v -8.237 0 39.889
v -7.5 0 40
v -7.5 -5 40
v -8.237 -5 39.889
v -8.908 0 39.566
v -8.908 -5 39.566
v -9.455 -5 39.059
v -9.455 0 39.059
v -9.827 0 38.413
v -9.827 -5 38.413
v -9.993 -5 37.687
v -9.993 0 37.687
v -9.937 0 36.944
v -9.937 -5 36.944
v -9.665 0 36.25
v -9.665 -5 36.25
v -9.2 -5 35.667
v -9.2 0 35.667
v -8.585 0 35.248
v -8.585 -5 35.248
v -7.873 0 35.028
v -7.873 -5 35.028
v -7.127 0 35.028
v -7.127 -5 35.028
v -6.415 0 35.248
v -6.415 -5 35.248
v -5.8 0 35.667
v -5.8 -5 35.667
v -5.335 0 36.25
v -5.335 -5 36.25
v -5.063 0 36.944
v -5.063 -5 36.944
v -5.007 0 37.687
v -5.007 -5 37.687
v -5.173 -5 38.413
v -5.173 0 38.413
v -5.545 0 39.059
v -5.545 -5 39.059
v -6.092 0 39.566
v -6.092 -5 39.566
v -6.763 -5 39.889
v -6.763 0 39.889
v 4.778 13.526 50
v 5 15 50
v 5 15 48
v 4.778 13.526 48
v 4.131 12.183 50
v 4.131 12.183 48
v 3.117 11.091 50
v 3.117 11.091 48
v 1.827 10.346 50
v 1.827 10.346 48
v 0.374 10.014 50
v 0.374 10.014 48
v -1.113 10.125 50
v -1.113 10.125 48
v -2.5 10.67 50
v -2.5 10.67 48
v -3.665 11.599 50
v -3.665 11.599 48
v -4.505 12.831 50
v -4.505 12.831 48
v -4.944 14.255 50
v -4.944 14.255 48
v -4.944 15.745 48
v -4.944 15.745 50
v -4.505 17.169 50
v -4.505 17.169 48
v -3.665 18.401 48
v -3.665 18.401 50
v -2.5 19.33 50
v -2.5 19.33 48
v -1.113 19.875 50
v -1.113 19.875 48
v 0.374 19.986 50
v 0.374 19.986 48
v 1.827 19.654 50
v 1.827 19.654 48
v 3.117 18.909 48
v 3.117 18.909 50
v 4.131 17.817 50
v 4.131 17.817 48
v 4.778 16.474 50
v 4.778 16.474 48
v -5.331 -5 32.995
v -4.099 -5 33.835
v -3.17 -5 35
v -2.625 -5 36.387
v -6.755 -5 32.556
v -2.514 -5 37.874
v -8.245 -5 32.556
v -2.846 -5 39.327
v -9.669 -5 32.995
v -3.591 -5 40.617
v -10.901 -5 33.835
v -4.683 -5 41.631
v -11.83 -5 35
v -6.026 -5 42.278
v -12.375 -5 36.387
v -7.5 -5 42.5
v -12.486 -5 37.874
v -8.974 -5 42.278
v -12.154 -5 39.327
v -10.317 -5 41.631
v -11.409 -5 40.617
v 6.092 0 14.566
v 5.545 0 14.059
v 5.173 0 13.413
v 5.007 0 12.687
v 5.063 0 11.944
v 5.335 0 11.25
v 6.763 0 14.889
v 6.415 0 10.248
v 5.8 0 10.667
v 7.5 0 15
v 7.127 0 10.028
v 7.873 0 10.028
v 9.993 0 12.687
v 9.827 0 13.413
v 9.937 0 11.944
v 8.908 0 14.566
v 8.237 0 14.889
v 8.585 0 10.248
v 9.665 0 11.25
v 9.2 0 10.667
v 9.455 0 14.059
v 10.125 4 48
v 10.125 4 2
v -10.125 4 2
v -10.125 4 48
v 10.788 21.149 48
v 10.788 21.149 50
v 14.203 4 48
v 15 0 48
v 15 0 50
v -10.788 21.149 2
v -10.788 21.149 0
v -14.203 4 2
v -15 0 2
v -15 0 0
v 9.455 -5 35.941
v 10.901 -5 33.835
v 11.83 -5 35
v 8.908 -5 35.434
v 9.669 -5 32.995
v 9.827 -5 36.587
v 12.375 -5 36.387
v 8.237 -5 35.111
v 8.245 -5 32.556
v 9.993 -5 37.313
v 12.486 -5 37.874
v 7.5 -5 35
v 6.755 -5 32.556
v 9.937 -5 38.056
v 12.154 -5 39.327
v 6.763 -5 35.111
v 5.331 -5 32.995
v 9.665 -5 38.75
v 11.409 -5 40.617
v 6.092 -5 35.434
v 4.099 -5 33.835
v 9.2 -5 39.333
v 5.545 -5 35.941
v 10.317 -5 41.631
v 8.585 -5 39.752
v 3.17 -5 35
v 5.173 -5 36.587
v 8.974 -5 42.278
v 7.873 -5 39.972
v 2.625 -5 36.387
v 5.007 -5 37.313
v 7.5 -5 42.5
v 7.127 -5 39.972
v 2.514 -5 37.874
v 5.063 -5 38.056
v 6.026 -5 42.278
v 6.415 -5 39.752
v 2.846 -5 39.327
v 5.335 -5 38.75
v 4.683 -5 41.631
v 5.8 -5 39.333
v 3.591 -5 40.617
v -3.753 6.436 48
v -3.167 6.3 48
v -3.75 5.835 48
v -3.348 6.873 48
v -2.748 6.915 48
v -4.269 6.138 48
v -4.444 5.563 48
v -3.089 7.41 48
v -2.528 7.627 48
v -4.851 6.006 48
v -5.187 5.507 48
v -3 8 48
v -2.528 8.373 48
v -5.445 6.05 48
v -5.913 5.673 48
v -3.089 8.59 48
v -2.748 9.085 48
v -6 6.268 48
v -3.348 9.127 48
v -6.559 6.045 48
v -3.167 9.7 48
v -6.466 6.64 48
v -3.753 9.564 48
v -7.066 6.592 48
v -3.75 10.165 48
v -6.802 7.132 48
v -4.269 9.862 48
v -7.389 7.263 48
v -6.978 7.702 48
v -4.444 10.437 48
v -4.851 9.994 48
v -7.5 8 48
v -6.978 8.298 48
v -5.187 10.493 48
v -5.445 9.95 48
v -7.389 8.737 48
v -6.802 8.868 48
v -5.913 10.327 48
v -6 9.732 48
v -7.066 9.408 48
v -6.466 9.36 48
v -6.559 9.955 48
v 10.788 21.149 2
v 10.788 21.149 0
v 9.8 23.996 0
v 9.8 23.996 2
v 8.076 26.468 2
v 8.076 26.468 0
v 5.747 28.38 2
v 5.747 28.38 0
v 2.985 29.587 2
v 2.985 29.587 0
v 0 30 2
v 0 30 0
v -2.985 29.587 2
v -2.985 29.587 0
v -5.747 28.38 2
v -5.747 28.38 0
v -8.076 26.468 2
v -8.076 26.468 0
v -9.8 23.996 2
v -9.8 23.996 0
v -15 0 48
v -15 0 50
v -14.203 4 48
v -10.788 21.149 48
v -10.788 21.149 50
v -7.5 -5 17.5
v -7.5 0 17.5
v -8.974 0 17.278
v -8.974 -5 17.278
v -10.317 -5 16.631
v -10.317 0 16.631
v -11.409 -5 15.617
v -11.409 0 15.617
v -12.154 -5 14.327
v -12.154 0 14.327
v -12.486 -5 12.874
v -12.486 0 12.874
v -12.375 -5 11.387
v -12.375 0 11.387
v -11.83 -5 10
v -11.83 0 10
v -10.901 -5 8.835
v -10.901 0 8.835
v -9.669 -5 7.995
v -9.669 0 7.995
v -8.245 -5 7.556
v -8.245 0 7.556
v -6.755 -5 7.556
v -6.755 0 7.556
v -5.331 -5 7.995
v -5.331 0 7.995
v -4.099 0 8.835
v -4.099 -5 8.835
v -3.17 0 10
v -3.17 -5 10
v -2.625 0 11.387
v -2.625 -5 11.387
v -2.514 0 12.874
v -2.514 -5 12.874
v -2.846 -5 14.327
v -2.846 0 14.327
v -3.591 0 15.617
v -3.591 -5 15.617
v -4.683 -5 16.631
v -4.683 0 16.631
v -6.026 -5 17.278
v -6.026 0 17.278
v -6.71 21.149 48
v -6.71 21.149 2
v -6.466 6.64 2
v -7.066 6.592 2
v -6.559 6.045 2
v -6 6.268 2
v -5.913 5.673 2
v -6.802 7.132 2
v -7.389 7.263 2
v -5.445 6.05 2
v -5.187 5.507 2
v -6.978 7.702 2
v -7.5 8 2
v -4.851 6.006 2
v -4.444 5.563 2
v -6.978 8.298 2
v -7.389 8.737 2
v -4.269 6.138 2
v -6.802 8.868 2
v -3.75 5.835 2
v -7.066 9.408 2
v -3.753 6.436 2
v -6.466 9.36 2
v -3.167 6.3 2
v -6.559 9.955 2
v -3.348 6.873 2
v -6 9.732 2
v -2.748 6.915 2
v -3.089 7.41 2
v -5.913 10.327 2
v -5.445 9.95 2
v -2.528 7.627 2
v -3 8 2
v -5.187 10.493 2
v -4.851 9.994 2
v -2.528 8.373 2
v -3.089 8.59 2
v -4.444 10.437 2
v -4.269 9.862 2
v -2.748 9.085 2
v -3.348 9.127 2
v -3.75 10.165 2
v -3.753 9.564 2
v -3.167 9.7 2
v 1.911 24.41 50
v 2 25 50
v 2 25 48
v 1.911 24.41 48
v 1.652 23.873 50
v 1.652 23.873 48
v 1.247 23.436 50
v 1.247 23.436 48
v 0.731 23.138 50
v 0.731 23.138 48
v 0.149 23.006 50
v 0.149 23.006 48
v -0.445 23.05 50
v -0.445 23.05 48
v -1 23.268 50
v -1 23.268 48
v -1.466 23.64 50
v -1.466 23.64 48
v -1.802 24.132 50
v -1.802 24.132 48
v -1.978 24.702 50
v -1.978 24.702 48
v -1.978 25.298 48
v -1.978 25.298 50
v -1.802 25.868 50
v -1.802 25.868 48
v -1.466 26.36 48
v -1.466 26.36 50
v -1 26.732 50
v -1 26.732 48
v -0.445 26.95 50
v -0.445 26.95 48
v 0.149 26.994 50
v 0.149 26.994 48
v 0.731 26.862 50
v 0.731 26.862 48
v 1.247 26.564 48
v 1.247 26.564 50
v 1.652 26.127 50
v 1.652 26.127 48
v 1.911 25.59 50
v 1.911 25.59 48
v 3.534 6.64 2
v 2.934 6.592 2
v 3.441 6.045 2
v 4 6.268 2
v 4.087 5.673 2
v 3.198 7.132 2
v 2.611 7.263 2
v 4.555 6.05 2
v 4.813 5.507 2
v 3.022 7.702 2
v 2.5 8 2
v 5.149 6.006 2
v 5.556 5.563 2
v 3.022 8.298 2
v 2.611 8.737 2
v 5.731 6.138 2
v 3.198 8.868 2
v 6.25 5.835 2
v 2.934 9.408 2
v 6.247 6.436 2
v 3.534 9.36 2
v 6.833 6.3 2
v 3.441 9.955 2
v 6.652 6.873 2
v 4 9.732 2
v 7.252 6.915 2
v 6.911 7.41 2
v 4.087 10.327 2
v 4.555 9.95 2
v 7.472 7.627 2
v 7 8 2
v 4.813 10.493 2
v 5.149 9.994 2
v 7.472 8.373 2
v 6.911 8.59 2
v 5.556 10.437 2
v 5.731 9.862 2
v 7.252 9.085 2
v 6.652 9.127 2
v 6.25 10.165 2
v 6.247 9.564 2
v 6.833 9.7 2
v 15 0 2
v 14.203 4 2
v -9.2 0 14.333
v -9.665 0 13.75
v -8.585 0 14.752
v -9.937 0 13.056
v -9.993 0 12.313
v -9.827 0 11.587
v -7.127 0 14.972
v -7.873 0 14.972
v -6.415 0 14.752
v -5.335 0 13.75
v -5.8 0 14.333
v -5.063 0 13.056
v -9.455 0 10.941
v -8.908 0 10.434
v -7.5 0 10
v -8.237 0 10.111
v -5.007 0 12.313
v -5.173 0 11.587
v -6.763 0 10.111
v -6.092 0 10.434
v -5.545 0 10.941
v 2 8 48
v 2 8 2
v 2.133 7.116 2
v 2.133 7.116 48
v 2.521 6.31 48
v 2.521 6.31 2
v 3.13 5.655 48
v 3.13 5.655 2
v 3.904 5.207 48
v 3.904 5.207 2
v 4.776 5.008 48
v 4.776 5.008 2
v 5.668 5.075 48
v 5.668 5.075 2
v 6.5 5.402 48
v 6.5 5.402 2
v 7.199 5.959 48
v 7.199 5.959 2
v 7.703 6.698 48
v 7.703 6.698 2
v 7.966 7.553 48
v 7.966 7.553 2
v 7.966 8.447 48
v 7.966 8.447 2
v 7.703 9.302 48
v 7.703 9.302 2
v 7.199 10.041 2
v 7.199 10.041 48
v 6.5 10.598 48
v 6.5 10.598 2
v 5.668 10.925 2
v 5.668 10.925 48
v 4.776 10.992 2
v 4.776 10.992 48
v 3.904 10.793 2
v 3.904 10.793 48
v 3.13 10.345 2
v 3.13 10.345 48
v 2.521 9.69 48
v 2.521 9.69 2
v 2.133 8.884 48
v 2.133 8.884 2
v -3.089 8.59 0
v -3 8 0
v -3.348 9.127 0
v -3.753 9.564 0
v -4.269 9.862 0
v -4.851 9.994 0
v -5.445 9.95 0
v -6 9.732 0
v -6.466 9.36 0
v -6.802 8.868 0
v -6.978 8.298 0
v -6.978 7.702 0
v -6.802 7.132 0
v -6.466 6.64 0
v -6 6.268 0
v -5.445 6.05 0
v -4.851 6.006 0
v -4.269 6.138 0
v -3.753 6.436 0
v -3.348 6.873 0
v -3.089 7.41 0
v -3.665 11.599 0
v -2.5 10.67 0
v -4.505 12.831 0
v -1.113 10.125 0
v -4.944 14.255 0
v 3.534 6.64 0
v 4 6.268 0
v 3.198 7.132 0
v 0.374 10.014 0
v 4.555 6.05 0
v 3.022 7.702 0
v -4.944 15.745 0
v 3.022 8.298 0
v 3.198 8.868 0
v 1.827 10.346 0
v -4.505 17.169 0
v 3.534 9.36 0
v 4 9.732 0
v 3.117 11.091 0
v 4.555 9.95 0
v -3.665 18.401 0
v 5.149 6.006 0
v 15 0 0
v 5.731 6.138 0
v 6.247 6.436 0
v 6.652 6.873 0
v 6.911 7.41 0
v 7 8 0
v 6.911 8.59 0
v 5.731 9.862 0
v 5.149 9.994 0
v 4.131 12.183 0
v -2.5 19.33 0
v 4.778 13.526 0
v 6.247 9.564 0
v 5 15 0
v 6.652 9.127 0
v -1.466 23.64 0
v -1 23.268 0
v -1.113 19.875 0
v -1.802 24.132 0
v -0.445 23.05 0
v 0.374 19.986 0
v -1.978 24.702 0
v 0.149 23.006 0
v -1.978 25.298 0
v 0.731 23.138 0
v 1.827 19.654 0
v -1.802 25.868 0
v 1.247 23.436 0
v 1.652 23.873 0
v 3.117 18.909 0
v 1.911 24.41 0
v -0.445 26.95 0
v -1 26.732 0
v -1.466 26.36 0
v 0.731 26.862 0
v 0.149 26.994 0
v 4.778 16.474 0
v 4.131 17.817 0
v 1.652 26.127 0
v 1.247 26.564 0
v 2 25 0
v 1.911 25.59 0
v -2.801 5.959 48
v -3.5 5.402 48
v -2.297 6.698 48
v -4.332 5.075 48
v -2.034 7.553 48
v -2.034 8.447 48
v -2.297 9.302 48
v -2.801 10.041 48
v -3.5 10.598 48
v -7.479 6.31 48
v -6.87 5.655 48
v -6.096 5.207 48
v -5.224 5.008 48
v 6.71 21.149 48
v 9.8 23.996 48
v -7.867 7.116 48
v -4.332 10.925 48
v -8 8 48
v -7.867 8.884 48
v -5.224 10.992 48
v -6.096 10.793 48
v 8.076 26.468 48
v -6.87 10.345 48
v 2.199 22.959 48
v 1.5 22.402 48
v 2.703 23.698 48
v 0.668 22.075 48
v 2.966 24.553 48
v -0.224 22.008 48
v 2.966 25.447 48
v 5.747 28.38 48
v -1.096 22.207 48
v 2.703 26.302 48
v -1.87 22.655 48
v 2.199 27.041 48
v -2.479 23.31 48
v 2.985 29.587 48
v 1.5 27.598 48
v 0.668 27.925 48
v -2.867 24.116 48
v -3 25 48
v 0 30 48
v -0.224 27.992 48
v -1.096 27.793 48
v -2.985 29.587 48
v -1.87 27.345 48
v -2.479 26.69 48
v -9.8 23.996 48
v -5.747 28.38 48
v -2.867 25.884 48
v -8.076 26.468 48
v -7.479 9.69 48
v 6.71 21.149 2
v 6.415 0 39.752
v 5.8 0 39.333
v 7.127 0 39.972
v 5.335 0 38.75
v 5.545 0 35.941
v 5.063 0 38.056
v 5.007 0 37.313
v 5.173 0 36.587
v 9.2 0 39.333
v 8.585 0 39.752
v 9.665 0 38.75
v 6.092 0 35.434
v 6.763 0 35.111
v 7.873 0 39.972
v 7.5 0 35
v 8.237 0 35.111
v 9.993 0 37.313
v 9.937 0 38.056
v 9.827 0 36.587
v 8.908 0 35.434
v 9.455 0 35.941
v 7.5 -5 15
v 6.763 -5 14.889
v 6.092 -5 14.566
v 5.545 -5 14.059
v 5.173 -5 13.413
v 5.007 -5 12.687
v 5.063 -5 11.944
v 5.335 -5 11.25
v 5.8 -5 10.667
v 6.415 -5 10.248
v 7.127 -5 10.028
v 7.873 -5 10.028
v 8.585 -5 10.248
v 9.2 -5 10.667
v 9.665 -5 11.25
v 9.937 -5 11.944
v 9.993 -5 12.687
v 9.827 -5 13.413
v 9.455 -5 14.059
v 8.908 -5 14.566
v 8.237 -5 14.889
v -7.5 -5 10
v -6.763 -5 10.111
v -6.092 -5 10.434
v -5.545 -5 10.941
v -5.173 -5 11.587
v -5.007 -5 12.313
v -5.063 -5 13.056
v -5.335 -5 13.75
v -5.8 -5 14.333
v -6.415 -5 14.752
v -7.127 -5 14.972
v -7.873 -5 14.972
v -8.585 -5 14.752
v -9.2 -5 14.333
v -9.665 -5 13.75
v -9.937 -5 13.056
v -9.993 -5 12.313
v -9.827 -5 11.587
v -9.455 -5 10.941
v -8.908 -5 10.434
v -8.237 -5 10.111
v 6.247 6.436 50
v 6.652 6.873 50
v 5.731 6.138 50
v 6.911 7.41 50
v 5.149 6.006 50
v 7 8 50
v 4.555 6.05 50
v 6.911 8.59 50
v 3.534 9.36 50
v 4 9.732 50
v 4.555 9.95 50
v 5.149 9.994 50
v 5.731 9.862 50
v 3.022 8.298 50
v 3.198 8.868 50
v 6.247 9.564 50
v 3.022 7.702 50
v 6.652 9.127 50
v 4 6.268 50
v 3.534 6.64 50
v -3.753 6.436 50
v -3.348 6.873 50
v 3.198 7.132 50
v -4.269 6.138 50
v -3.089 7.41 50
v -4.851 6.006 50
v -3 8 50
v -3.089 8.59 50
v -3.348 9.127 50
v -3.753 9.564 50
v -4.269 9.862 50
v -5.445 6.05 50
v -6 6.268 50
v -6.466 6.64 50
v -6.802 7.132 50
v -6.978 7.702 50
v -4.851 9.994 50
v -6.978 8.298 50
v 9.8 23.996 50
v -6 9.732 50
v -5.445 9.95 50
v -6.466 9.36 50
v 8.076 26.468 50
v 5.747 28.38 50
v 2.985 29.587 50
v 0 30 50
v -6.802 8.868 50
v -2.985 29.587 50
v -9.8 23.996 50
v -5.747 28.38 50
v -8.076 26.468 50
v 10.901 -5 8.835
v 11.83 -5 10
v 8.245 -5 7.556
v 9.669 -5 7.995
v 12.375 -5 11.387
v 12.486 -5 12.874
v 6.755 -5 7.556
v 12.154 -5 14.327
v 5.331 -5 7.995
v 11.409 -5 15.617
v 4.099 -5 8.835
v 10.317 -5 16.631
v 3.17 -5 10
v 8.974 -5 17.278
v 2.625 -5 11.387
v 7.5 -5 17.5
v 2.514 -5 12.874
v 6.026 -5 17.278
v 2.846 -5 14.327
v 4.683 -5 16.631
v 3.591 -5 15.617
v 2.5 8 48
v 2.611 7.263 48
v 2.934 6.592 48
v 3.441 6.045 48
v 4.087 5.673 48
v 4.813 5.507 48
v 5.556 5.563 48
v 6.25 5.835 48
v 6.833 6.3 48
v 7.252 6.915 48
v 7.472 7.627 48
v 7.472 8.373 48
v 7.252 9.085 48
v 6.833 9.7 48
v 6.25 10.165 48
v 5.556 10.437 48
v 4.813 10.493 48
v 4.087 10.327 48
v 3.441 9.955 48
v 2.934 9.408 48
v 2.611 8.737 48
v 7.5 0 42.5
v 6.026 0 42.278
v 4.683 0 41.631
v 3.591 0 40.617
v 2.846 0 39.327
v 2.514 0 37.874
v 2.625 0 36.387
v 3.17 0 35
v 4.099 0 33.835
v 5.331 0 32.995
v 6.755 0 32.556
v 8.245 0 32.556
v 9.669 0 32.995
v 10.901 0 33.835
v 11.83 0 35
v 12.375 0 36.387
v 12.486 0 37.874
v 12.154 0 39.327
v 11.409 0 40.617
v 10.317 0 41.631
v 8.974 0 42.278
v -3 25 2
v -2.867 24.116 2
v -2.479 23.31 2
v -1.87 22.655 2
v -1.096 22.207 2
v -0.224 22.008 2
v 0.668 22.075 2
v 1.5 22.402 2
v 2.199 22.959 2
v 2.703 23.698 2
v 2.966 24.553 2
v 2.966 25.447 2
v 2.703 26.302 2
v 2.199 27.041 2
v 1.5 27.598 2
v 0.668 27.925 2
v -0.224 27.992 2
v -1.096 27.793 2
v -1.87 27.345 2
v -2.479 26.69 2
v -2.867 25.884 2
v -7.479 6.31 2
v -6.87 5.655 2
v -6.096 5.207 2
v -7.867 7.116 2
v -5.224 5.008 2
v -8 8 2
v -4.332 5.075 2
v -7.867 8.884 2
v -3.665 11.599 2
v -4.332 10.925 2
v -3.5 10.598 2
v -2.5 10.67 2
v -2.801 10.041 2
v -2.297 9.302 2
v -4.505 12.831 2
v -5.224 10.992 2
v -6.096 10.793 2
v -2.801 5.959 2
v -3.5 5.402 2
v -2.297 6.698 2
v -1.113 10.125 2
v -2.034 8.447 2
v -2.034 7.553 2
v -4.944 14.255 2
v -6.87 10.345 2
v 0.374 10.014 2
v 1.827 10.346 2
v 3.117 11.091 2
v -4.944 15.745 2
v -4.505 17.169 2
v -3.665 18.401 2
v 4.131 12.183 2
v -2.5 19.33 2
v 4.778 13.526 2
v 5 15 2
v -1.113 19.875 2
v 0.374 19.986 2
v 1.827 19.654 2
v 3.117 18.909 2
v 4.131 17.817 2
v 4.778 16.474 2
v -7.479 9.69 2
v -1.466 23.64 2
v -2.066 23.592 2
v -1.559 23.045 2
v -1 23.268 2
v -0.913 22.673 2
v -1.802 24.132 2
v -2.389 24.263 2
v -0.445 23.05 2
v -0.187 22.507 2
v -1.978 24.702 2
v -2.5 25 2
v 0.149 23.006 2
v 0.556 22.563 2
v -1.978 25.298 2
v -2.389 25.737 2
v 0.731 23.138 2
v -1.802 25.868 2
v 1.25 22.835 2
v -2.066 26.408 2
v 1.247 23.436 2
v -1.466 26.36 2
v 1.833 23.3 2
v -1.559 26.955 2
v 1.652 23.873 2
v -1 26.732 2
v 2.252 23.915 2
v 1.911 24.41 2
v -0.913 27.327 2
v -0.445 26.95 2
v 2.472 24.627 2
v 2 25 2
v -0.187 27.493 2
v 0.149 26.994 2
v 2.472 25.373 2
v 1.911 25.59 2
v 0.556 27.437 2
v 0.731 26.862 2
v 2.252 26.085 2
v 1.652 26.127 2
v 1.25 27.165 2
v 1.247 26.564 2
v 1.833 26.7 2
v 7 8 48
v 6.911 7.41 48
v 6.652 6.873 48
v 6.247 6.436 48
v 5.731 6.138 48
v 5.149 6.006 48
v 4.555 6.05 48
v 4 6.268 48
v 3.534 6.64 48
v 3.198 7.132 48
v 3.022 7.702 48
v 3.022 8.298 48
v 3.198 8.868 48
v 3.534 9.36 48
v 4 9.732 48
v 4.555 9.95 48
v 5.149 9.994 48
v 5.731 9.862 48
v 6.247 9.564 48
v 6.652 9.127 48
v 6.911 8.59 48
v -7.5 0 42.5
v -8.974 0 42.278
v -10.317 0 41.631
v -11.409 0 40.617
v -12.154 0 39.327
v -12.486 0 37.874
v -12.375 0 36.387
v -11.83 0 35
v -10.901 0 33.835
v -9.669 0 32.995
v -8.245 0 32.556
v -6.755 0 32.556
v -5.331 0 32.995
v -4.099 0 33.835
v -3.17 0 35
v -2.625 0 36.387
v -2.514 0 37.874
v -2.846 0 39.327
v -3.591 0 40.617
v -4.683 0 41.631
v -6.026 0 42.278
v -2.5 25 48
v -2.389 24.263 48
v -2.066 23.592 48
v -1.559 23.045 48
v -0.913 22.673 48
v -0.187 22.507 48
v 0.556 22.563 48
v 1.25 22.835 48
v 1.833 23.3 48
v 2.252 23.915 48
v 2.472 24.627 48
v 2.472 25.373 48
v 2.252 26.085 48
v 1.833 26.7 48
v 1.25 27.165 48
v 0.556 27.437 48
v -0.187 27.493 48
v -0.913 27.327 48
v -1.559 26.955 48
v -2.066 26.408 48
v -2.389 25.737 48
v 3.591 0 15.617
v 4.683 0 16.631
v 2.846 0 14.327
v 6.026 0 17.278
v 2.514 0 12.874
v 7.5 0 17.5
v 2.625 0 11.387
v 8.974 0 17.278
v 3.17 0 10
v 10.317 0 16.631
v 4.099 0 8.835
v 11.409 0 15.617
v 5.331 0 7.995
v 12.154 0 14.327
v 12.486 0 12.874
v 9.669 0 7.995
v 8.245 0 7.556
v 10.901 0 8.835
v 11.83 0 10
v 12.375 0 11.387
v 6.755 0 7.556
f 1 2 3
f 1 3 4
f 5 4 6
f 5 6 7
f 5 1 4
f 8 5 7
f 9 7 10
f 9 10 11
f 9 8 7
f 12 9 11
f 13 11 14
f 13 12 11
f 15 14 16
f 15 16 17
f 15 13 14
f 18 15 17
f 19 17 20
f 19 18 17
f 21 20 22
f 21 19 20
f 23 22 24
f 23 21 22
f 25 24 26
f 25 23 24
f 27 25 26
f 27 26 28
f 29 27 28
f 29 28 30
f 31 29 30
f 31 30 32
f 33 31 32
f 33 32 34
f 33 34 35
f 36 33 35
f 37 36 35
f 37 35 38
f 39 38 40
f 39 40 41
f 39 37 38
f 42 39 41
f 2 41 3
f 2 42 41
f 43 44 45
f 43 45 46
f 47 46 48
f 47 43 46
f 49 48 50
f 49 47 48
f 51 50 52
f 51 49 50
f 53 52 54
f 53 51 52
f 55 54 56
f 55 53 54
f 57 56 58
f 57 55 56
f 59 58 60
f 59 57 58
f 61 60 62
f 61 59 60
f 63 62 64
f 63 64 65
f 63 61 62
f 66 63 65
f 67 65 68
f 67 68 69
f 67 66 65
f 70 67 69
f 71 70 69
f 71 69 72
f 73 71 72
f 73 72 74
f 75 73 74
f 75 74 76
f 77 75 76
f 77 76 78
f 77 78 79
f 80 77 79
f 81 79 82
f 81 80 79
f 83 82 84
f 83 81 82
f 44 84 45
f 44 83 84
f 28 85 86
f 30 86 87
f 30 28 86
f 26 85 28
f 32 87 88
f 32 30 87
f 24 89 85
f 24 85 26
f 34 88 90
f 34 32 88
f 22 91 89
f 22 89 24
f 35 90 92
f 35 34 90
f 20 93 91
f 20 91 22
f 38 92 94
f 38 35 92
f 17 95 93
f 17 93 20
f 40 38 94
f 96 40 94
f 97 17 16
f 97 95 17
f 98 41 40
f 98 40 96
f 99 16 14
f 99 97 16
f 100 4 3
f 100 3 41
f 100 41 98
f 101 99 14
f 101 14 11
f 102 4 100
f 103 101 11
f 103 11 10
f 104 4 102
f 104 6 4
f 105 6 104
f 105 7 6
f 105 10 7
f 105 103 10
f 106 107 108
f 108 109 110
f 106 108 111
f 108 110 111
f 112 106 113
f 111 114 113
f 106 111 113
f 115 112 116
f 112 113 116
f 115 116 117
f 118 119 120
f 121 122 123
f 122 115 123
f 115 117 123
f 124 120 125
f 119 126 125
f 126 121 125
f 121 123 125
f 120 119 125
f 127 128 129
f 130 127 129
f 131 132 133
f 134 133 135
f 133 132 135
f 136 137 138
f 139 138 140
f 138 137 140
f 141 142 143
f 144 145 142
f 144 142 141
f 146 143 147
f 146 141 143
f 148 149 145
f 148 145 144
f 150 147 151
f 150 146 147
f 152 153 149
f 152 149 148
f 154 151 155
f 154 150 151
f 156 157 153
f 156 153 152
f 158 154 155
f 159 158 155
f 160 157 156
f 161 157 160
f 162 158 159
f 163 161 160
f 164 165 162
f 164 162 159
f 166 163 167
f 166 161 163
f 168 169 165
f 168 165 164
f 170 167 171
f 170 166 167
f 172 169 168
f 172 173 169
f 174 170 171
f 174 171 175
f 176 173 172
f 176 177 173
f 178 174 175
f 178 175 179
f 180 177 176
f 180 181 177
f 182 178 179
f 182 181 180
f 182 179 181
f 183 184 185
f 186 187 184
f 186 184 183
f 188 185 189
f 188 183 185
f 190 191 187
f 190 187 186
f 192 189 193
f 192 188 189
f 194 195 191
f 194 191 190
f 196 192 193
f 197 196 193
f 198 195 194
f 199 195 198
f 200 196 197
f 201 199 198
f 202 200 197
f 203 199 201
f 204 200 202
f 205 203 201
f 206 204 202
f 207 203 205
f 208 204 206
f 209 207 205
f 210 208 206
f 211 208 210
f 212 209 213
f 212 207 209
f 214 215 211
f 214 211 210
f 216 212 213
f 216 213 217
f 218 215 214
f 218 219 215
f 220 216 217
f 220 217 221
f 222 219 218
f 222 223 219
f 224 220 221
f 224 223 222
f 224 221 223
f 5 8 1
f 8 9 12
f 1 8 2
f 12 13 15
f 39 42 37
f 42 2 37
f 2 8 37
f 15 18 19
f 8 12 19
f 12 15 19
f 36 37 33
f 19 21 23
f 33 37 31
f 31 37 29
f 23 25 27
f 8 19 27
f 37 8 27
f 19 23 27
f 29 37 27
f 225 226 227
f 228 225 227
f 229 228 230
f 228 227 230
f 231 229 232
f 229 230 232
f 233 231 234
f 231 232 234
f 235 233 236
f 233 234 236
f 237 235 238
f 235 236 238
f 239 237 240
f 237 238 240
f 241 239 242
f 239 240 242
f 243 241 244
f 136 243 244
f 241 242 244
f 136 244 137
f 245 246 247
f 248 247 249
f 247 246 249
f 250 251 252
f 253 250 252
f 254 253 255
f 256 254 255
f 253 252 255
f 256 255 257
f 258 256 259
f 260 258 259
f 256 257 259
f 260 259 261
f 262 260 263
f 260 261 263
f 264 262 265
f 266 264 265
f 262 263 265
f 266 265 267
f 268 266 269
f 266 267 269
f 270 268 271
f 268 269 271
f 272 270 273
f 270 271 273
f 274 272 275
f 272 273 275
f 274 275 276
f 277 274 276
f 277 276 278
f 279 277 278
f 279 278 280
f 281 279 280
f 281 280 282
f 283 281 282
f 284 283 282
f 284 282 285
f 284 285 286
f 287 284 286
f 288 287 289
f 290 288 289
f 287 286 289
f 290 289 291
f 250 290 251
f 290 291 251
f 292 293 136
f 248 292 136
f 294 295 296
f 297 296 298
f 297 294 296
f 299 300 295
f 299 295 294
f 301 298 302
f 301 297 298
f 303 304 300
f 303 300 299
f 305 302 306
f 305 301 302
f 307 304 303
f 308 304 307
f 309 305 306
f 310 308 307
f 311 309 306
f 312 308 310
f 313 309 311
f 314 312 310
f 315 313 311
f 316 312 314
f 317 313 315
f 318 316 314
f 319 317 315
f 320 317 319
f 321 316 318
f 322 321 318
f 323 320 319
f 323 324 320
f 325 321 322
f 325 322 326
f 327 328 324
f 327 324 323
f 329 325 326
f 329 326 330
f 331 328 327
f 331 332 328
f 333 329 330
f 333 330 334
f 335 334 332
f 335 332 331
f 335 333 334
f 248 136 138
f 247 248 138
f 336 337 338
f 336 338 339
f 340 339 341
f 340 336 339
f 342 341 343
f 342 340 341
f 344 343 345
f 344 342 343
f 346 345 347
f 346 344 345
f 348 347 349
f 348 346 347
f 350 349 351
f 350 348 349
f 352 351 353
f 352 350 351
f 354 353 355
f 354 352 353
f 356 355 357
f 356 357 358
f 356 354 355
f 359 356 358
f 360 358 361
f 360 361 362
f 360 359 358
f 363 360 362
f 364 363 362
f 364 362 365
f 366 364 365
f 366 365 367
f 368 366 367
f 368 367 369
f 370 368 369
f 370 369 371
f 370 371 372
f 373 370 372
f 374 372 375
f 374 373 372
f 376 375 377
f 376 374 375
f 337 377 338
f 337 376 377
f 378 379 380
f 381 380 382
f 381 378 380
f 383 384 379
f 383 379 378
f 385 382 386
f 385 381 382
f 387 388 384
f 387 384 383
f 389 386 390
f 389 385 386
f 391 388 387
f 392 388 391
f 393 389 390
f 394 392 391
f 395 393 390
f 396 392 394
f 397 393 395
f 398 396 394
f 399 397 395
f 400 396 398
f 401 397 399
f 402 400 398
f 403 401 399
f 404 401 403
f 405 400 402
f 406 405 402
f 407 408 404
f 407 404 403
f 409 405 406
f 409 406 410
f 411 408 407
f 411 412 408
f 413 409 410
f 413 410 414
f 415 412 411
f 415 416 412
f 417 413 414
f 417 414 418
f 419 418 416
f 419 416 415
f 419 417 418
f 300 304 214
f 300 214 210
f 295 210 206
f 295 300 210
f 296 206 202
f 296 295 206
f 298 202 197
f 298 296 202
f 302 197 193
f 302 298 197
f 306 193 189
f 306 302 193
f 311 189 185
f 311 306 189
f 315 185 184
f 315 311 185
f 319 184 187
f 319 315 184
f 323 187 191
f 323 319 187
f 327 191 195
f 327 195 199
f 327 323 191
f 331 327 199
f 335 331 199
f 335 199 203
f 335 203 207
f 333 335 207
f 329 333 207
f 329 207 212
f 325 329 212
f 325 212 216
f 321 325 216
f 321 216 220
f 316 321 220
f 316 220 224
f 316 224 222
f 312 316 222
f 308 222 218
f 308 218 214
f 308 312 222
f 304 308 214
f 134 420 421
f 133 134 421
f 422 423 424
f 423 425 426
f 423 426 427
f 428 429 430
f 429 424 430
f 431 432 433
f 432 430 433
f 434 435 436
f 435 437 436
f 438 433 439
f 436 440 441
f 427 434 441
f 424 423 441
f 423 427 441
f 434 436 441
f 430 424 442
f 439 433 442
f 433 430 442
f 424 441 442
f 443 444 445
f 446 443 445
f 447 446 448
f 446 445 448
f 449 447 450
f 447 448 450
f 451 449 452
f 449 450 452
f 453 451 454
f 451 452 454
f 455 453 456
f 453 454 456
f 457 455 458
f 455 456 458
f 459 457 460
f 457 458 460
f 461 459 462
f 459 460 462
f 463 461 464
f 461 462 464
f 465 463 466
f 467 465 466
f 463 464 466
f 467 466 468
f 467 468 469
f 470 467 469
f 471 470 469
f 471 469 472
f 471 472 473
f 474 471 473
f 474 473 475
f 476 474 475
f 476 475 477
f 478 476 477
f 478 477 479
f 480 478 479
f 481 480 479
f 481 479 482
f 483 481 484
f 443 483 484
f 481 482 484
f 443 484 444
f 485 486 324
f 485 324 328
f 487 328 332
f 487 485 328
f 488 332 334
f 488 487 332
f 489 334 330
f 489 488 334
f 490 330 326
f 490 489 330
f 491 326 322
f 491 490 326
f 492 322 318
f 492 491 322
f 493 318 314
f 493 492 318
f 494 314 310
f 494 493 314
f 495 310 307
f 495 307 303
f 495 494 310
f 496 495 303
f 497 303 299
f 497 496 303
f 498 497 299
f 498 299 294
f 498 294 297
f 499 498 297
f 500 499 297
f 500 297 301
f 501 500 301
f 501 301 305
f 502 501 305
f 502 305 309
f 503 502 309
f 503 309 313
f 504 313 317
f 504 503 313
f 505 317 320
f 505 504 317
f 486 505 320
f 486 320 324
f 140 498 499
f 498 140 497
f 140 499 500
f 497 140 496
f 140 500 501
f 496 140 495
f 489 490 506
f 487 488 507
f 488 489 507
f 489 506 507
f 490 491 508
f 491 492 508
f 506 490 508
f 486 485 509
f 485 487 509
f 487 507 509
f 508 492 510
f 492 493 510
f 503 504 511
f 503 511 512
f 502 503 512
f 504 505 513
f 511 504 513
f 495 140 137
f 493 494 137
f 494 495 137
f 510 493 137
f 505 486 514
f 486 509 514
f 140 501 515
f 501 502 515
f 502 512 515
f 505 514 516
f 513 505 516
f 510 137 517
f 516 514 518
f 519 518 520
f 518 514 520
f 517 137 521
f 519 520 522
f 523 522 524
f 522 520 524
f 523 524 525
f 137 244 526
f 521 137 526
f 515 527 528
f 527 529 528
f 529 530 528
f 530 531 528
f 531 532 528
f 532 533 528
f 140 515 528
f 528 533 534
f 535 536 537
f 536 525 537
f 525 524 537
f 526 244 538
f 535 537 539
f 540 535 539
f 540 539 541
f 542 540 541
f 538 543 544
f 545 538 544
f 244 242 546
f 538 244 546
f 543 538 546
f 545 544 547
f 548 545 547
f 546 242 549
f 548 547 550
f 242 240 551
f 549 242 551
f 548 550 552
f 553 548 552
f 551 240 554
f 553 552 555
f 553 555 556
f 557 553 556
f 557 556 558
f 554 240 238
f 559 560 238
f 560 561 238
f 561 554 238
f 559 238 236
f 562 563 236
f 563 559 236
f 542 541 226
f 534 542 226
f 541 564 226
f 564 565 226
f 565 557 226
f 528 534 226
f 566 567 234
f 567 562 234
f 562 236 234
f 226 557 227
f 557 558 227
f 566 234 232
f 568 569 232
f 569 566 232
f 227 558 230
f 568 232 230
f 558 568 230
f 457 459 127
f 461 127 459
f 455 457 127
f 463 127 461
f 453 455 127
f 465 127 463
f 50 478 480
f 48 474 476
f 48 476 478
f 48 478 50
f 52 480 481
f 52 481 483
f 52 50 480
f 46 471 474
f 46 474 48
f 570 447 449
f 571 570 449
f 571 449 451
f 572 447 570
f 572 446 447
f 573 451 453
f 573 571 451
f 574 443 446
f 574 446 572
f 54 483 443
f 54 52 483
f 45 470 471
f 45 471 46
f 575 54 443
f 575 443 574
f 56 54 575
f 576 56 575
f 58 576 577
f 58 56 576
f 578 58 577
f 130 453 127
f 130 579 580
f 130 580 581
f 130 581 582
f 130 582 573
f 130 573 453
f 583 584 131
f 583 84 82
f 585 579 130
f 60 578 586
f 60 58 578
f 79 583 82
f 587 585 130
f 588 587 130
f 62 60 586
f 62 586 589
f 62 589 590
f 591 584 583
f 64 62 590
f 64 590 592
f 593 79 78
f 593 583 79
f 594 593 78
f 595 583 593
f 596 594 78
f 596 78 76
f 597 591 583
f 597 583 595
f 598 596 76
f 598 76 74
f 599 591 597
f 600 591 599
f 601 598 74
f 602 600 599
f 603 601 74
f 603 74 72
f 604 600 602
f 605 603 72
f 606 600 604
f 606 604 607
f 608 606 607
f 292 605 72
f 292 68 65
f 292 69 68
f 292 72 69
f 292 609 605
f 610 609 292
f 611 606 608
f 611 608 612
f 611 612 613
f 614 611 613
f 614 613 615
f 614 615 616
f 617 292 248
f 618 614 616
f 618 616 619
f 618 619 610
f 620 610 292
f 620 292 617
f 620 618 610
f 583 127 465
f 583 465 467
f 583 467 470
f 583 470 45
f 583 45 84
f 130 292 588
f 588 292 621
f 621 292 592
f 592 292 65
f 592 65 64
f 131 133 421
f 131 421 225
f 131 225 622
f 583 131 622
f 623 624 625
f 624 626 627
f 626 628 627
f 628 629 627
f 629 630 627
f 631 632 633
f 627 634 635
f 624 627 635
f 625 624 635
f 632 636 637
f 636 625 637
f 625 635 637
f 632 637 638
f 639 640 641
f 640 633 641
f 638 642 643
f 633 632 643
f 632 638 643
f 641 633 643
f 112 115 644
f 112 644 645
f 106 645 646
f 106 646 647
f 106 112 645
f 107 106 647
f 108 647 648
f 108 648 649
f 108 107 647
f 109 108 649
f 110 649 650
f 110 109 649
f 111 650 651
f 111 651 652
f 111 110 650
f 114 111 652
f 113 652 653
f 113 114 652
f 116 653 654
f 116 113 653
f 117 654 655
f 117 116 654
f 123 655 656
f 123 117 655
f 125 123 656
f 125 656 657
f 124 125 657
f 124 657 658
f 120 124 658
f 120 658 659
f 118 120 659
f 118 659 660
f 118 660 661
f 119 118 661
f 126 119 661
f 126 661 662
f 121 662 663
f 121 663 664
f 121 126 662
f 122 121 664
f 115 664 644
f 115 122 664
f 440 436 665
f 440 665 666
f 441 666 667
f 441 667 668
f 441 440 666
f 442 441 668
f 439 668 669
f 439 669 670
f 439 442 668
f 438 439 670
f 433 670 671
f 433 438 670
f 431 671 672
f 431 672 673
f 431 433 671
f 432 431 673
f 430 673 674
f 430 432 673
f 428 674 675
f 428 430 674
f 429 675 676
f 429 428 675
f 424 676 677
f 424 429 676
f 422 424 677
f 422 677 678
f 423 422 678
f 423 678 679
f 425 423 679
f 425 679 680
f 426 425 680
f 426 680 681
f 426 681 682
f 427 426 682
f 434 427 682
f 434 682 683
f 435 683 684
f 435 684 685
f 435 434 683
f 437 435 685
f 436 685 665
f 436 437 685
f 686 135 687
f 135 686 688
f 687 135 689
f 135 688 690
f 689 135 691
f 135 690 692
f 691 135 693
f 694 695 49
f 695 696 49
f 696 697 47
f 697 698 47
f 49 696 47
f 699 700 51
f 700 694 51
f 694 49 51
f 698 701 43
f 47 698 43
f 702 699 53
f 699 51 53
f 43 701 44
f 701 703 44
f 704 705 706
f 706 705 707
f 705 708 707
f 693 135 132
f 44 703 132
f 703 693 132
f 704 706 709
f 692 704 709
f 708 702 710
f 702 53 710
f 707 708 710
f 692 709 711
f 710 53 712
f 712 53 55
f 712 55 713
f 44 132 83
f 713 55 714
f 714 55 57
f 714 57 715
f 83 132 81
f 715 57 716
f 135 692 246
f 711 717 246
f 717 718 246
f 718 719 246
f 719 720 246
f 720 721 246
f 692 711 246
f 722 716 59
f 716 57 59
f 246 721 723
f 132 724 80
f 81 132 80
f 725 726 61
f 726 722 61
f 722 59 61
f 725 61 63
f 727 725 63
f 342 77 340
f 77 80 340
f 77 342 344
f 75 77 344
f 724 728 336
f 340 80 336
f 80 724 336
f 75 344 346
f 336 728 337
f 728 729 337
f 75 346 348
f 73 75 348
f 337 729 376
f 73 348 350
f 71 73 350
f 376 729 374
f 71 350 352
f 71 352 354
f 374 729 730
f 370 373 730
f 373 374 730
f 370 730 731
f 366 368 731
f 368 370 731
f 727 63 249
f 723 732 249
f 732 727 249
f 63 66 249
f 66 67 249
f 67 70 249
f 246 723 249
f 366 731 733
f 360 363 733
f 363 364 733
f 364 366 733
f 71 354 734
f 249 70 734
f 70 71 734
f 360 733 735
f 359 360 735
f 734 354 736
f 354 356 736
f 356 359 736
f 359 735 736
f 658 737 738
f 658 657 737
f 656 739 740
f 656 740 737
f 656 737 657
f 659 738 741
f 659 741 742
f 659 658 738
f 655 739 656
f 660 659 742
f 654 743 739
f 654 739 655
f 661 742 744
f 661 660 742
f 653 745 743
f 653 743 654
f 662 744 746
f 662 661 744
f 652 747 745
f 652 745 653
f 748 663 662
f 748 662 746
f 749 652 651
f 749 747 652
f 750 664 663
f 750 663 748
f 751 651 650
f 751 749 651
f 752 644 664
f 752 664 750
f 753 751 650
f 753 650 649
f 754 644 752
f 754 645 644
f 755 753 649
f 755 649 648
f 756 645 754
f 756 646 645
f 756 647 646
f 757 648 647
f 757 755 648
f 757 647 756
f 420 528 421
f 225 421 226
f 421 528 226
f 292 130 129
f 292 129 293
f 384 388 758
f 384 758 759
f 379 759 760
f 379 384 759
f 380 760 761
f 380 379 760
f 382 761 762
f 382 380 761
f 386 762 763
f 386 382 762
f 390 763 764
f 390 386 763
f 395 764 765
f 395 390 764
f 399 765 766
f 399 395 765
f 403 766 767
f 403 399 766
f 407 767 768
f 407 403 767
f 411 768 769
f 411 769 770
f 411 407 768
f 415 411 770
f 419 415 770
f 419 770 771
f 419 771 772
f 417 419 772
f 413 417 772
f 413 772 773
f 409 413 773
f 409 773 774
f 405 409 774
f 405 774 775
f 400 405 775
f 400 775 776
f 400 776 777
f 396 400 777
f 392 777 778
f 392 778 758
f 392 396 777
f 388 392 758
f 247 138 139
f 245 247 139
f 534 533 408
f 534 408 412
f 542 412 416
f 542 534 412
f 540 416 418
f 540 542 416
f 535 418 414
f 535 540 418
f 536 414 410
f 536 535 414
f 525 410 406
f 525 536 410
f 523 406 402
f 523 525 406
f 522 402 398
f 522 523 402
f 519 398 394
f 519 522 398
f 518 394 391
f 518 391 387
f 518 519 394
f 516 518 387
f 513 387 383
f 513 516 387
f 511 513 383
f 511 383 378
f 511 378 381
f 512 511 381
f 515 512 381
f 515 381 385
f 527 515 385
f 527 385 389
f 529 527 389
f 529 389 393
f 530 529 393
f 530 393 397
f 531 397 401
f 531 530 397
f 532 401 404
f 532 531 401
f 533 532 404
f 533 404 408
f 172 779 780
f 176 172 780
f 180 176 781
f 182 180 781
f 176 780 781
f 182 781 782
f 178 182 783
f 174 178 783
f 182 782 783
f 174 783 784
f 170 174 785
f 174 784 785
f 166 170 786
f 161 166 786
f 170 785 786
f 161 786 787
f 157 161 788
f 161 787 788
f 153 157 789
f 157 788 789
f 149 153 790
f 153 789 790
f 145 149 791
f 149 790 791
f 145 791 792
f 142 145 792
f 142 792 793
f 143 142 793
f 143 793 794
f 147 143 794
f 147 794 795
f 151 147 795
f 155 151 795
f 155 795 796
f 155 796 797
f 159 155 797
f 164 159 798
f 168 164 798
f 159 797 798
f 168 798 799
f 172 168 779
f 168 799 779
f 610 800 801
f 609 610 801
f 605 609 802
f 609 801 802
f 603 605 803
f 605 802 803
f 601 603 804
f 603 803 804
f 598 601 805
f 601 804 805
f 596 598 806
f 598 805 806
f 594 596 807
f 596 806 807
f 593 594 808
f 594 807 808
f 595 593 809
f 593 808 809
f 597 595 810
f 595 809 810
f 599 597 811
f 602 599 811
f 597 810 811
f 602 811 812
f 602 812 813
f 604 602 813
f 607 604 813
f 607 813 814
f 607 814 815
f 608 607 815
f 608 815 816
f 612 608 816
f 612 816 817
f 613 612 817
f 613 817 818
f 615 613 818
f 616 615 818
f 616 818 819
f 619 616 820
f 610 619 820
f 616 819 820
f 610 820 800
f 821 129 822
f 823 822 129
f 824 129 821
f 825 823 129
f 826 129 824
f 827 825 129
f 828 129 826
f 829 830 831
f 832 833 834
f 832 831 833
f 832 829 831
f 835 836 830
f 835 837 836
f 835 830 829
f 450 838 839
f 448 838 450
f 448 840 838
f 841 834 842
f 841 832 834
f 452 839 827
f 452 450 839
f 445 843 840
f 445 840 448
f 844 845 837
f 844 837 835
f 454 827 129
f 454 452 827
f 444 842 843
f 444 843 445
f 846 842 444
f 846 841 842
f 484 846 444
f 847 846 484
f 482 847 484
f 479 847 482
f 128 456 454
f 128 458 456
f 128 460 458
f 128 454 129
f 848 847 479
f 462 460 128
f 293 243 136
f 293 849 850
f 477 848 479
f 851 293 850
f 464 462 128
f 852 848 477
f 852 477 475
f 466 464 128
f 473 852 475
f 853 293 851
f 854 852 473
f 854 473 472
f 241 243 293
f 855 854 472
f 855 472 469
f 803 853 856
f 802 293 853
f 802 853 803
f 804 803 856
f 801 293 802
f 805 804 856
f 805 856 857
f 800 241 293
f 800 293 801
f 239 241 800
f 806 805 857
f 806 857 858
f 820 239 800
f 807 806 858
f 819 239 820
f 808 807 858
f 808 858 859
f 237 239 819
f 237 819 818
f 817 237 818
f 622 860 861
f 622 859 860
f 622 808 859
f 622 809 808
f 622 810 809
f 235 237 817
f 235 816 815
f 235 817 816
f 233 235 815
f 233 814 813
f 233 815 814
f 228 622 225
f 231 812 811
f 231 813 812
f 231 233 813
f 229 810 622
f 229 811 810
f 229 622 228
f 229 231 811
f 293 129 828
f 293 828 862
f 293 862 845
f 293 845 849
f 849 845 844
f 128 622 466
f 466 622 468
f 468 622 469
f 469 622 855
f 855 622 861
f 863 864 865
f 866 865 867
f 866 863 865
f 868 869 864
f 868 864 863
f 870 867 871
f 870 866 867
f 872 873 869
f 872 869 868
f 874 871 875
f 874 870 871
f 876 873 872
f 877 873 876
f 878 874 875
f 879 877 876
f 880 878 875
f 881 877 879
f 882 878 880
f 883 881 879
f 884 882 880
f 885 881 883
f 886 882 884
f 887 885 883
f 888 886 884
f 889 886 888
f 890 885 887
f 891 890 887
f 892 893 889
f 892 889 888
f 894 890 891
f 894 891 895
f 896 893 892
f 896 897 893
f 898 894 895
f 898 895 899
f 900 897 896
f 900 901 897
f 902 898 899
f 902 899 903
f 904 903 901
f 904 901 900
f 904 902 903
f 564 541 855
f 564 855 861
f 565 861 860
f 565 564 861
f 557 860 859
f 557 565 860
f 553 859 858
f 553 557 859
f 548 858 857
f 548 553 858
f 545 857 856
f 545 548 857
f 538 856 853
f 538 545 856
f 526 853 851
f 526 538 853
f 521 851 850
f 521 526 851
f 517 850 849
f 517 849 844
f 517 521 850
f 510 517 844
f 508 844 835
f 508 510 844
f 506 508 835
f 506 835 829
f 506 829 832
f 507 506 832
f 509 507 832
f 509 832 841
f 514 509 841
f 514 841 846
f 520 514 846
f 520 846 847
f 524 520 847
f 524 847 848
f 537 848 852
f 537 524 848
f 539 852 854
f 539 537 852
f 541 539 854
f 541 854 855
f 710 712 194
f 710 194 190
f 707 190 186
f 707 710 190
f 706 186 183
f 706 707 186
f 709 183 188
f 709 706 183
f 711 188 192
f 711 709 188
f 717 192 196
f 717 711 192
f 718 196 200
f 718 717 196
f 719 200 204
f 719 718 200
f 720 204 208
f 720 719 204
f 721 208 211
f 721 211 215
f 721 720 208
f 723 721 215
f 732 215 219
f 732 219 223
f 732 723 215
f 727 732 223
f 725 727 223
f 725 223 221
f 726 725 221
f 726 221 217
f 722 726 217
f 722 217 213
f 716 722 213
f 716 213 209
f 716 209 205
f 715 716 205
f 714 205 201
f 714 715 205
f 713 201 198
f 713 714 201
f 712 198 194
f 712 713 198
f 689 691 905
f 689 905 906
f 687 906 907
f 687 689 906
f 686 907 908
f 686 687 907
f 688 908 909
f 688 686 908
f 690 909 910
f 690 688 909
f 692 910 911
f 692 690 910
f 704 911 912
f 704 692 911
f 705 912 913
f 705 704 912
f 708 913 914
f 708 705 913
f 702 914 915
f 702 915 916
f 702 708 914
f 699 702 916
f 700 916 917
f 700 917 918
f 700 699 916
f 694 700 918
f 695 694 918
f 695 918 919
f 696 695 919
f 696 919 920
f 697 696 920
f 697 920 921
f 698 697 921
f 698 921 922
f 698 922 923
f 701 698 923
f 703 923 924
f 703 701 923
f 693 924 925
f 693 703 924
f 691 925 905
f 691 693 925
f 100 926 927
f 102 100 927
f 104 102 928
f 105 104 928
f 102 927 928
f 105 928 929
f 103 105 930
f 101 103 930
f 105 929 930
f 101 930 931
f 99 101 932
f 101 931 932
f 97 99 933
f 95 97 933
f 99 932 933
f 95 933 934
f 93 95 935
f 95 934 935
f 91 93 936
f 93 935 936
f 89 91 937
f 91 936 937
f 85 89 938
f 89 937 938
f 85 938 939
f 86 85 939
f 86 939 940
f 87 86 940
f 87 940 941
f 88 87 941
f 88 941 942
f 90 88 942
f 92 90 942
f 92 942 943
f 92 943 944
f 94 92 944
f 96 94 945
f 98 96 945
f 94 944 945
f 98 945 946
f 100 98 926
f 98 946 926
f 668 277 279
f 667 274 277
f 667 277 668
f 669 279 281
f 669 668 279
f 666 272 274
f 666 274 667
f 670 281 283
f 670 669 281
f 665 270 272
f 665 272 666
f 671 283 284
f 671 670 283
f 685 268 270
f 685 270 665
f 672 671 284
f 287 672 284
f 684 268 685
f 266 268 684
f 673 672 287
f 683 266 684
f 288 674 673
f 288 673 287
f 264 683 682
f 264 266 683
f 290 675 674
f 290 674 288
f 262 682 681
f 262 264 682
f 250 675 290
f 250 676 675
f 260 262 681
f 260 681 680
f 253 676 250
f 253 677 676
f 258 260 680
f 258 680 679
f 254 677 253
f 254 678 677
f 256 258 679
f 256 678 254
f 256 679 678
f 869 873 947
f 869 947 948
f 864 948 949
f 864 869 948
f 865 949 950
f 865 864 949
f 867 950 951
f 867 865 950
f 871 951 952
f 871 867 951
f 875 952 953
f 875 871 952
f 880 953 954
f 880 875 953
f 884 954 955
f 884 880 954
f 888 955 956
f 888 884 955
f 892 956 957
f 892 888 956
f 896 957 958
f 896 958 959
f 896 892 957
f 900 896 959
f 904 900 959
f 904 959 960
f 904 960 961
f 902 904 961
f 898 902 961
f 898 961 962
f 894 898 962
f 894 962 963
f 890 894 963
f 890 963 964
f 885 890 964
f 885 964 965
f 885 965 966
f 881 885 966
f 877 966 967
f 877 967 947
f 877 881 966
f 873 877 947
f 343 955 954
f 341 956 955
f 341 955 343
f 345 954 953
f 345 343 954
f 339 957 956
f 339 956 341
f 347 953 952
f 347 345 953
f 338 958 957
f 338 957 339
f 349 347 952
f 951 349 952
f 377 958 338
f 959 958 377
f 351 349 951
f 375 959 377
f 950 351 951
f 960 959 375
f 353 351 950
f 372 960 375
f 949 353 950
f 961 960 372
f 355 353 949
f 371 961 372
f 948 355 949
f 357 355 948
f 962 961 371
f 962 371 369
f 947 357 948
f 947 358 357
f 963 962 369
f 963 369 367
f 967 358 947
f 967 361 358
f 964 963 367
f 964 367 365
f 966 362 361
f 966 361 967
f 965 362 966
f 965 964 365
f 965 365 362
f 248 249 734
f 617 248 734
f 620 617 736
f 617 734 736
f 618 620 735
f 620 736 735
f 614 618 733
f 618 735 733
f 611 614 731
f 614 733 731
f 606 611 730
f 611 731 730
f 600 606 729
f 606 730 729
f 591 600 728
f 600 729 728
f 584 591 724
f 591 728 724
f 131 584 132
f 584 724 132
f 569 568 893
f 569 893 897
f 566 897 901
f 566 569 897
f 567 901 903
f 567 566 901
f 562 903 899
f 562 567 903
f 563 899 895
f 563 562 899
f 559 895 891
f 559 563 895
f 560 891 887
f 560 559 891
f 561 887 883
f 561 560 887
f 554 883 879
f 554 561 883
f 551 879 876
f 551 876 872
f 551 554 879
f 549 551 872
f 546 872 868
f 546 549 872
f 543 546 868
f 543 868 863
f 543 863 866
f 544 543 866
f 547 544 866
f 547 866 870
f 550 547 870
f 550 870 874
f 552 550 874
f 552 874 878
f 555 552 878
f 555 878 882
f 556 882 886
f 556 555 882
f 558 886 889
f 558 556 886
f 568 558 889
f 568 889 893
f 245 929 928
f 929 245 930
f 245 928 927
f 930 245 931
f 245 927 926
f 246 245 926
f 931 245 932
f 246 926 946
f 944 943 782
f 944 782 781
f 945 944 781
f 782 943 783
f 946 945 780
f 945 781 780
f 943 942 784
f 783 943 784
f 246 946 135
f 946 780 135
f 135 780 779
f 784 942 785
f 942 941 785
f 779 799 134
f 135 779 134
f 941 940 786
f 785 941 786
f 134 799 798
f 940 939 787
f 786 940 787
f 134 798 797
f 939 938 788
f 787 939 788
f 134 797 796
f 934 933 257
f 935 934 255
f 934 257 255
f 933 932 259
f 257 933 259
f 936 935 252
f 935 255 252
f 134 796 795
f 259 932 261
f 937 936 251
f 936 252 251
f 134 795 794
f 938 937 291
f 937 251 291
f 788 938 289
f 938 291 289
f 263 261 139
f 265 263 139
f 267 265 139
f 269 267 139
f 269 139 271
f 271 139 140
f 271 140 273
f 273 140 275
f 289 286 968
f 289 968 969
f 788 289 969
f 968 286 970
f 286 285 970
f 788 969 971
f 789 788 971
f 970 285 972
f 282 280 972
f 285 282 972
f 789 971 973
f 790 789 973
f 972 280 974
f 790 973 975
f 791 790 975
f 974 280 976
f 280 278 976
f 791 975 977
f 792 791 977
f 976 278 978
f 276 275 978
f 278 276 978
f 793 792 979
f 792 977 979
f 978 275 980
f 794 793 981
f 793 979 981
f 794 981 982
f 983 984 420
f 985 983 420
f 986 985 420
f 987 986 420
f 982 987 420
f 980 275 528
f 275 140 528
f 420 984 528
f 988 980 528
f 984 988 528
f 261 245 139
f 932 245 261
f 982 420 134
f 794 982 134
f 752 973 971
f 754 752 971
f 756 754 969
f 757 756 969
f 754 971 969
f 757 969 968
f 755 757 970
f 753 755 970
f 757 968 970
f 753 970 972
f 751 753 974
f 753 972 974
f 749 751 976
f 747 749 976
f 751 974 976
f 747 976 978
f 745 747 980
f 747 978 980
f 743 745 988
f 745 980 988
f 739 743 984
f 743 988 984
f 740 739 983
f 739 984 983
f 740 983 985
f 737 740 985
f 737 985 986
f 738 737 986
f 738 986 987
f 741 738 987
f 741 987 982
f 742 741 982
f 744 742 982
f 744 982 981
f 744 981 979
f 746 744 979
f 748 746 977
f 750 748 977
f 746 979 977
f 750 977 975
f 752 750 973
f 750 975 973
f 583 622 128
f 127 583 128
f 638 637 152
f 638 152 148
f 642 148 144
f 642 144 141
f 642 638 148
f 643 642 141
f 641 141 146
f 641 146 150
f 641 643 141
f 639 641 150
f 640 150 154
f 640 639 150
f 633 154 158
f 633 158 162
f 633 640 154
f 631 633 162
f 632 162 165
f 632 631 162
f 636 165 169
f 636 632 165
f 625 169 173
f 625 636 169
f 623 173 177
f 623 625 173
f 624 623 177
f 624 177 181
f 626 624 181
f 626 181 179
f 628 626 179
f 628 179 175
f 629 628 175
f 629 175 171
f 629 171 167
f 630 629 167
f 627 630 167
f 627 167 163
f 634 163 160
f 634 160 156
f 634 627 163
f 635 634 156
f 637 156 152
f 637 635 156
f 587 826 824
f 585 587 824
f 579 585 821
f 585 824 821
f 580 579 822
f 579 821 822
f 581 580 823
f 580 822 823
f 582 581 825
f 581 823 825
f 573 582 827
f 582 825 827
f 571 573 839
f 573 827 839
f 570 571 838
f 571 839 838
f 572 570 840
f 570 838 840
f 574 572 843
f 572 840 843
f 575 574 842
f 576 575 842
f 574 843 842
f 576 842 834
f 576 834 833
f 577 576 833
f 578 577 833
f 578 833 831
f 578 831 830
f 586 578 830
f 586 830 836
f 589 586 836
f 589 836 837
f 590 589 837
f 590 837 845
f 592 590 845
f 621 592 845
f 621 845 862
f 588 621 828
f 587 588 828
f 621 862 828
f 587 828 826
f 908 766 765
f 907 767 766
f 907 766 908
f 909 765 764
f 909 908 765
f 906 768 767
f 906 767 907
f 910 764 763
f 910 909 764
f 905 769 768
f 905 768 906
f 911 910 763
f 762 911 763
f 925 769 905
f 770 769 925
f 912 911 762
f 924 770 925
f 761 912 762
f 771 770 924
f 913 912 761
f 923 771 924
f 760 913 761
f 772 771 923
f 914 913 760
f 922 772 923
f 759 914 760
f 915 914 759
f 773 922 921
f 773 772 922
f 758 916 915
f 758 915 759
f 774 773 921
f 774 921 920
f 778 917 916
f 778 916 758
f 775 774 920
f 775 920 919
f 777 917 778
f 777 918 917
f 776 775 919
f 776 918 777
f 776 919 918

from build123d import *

# Parameters (mm, degrees)
SKETCH1_R           = 5
SKETCH1_R_2         = 2
BOSS_EXTRUDE1_DEPTH = 2
SKETCH2_R           = 2
SKETCH2_R_2         = 5
BOSS_EXTRUDE2_DEPTH = 2
SKETCH3_R           = 3
SKETCH3_R_2         = 2.5
BOSS_EXTRUDE3_DEPTH = 46
BOSS_EXTRUDE5_DEPTH = 46
SKETCH7_R           = 5
SKETCH7_R_2         = 2.5
BOSS_EXTRUDE6_DEPTH = 5


with BuildPart() as part:
    # Sketch1 → Boss-Extrude1 (new body)
    with BuildSketch(Plane.XY):
        with BuildLine():
            Line((-15, 0), (15, 0))
            Line((15, 0), (10.788133888, 21.148526754))
            ThreePointArc((10.788133888, 21.148526754), (0, 30), (-10.788133888, 21.148526754))
            Line((-10.788133888, 21.148526754), (-15, 0))
        make_face()
        with Locations((0, 15)):
            Circle(SKETCH1_R, mode=Mode.SUBTRACT)
        with Locations((5, 8)):
            Circle(SKETCH1_R_2, mode=Mode.SUBTRACT)
        with Locations((-5, 8)):
            Circle(SKETCH1_R_2, mode=Mode.SUBTRACT)
        with Locations((0, 25)):
            Circle(SKETCH1_R_2, mode=Mode.SUBTRACT)
    extrude(amount=BOSS_EXTRUDE1_DEPTH)



with BuildPart() as body_2:
    # Sketch2 → Boss-Extrude2 (new body)
    with BuildSketch(Plane(origin=(0, 0, 50), x_dir=(-1, 0, 0), z_dir=(0, 0, -1))):
        with BuildLine():
            Line((-10.788133888, 21.148526754), (-15, 0))
            Line((-15, 0), (15, 0))
            Line((15, 0), (10.788133888, 21.148526754))
            ThreePointArc((10.788133888, 21.148526754), (0, 30), (-10.788133888, 21.148526754))
        make_face()
        with Locations(Location((-5, 8, 0), (0, 0, 180))):
            Circle(SKETCH2_R, mode=Mode.SUBTRACT)
        with Locations(Location((5, 8, 0), (0, 0, 180))):
            Circle(SKETCH2_R, mode=Mode.SUBTRACT)
        with Locations(Location((0, 25, 0), (0, 0, 180))):
            Circle(SKETCH2_R, mode=Mode.SUBTRACT)
        with Locations(Location((0, 15, 0), (0, 0, 180))):
            Circle(SKETCH2_R_2, mode=Mode.SUBTRACT)
    extrude(amount=BOSS_EXTRUDE2_DEPTH)


with BuildPart() as part_1:
    add(part.part)

    add(body_2.part)  # Boss-Extrude3 merges body 2
    # Sketch3 → Boss-Extrude3 (add)
    # profile 1 of 3: a face of its own
    with BuildSketch(Plane.XY.offset(2)):
        with Locations(Location((5, 8, 0), (0, 0, 180))):
            Circle(SKETCH3_R)
        with Locations(Location((5, 8, 0), (0, 0, 180))):
            Circle(SKETCH3_R_2, mode=Mode.SUBTRACT)
    # profile 2 of 3: a face of its own
    with BuildSketch(Plane.XY.offset(2)):
        with Locations(Location((0, 25, 0), (0, 0, 180))):
            Circle(SKETCH3_R)
        with Locations(Location((0, 25, 0), (0, 0, 180))):
            Circle(SKETCH3_R_2, mode=Mode.SUBTRACT)
    # profile 3 of 3: a face of its own
    with BuildSketch(Plane.XY.offset(2)):
        with Locations(Location((-5, 8, 0), (0, 0, 180))):
            Circle(SKETCH3_R)
        with Locations(Location((-5, 8, 0), (0, 0, 180))):
            Circle(SKETCH3_R_2, mode=Mode.SUBTRACT)
    extrude(amount=BOSS_EXTRUDE3_DEPTH)

    # Sketch4 → Boss-Extrude5 (add)
    with BuildSketch(Plane.XY.offset(2)):
        Polygon((-10.788133888, 21.148526754), (-14.203374086, 4), (-10.124818846, 4), (-6.709578648, 21.148526754), align=None)
        Polygon((10.124818846, 4), (14.203374086, 4), (10.788133888, 21.148526754), (6.709578648, 21.148526754), align=None)
        Polygon((-14.203374086, 4), (-15, 0), (15, 0), (14.203374086, 4), (10.124818846, 4), (-10.124818846, 4), align=None)
    extrude(amount=BOSS_EXTRUDE5_DEPTH)

    # Sketch7 → Boss-Extrude6 (add)
    # profile 1 of 4: a face of its own
    with BuildSketch(Plane.XZ):
        with Locations(Location((7.5, 37.5, 0), (0, 0, 90))):
            Circle(SKETCH7_R)
        with Locations(Location((7.5, 37.5, 0), (0, 0, 270))):
            Circle(SKETCH7_R_2, mode=Mode.SUBTRACT)
    # profile 2 of 4: a face of its own
    with BuildSketch(Plane.XZ):
        with Locations(Location((7.5, 12.5, 0), (0, 0, 90))):
            Circle(SKETCH7_R)
        with Locations(Location((7.5, 12.5, 0), (0, 0, 90))):
            Circle(SKETCH7_R_2, mode=Mode.SUBTRACT)
    # profile 3 of 4: a face of its own
    with BuildSketch(Plane.XZ):
        with Locations(Location((-7.5, 12.5, 0), (0, 0, 90))):
            Circle(SKETCH7_R)
        with Locations(Location((-7.5, 12.5, 0), (0, 0, 270))):
            Circle(SKETCH7_R_2, mode=Mode.SUBTRACT)
    # profile 4 of 4: a face of its own
    with BuildSketch(Plane.XZ):
        with Locations(Location((-7.5, 37.5, 0), (0, 0, 90))):
            Circle(SKETCH7_R)
        with Locations(Location((-7.5, 37.5, 0), (0, 0, 90))):
            Circle(SKETCH7_R_2, mode=Mode.SUBTRACT)
    extrude(amount=BOSS_EXTRUDE6_DEPTH)


solid = part_1.part
